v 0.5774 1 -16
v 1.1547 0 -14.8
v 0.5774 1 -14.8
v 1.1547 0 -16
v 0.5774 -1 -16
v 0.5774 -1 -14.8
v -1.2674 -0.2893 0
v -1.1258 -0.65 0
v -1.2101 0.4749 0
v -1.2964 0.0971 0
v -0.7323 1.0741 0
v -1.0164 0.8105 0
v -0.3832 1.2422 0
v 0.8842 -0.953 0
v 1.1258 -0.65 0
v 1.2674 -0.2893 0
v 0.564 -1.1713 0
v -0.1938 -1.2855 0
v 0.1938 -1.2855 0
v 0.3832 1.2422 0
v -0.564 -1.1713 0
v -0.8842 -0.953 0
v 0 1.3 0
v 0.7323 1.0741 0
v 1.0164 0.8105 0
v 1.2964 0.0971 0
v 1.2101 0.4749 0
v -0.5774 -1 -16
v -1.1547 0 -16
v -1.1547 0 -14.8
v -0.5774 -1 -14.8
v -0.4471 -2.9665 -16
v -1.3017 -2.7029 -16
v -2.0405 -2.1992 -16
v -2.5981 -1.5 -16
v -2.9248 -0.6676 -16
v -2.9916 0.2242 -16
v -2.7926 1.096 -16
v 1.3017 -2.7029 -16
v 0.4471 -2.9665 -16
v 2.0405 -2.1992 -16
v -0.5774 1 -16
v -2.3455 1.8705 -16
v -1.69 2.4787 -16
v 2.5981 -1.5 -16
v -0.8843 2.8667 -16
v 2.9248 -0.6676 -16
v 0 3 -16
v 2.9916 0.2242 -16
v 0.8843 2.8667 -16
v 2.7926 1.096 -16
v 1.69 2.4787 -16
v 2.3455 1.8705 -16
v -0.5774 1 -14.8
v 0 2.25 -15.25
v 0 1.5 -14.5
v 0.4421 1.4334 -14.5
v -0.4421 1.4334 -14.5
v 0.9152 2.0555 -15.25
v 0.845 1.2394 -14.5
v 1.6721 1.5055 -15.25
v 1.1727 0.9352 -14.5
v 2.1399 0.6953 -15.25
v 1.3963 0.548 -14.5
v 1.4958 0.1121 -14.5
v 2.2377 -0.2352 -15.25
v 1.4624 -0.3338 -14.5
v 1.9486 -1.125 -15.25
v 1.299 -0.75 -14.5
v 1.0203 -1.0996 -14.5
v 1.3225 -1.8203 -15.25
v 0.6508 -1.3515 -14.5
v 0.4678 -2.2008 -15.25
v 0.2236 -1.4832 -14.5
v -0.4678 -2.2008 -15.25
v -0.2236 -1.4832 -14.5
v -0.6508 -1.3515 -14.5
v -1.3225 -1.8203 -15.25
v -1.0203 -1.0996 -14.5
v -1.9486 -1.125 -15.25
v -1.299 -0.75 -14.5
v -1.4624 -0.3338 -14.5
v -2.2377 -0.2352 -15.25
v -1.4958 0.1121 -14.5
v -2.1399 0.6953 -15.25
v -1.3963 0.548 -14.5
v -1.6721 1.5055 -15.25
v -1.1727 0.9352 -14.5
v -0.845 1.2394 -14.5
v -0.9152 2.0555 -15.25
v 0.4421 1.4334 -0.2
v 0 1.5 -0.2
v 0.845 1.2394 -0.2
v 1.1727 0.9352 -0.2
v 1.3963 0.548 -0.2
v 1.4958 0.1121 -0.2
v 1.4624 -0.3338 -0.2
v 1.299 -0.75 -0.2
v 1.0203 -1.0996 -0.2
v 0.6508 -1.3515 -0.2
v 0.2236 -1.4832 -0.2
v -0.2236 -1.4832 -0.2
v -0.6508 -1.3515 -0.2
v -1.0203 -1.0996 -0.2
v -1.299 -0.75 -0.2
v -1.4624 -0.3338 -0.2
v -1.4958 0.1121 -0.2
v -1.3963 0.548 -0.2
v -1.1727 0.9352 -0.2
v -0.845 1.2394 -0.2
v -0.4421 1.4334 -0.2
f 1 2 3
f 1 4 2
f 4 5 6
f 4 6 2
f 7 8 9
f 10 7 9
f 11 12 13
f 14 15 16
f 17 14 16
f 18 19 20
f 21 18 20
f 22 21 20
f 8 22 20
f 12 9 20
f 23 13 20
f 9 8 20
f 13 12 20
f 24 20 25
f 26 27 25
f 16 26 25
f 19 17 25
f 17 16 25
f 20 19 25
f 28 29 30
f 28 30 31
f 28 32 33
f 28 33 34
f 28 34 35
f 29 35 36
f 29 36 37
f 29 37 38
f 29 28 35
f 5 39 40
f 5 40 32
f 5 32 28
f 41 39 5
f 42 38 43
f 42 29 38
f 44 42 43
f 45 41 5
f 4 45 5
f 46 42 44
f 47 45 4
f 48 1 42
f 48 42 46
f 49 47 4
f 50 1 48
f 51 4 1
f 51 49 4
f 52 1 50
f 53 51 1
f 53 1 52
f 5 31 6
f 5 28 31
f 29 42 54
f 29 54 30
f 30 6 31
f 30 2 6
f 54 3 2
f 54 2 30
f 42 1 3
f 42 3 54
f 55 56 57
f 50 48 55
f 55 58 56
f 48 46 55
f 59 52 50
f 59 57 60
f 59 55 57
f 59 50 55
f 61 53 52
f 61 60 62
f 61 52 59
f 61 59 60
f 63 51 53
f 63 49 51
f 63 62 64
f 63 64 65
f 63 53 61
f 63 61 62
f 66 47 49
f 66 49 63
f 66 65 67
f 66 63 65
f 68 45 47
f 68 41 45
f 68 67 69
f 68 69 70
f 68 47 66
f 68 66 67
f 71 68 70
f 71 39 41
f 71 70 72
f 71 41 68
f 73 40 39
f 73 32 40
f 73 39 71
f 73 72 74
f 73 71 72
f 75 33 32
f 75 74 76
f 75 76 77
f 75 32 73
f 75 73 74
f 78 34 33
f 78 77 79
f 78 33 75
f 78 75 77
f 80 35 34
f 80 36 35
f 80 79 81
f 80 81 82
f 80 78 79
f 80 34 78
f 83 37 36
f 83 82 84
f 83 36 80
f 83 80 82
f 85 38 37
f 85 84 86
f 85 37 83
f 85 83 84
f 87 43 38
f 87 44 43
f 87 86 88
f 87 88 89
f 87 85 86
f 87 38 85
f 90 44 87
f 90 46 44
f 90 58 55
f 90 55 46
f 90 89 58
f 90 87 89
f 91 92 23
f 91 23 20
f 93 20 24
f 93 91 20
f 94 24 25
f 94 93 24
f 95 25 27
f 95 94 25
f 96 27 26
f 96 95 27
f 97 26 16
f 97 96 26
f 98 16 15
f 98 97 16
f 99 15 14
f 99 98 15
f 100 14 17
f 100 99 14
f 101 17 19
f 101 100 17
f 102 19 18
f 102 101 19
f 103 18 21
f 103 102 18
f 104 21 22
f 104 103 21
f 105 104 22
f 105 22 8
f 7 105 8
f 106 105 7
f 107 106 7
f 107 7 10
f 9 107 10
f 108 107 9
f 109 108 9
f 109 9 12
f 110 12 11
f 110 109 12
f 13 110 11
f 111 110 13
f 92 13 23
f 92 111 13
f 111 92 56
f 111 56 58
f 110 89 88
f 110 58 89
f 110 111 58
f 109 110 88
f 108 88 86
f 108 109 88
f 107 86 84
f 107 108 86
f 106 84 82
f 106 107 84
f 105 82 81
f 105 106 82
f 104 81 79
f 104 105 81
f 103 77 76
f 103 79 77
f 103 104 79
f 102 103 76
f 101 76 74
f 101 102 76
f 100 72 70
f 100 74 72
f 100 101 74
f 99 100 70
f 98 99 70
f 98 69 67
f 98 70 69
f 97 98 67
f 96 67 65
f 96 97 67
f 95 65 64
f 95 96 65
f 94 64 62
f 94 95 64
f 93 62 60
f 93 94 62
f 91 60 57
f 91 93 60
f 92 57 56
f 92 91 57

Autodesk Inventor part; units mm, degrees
ref_plane "YZ Plane" through (0, 0, 0) normal (1, 0, 0) x (0, 1, 0)
ref_plane "XZ Plane" through (0, 0, 0) normal (0, 1, 0) x (-1, 0, 0)
ref_plane "XY Plane" through (0, 0, 0) normal (0, 0, 1) x (1, 0, 0)
sketch "Sketch1" plane through (0, 0, 0) normal (1, 0, 0) x (0, 1, 0)
  line L0 (0, 0) -> (0, -16)
  line L1 (0, -16) -> (3, -16)
  line L2 (3, -16) -> (1.5, -14.5)
  line L3 (1.5, -14.5) -> (1.5, 0)
  line L4 (1.5, 0) -> (0, 0)
  dimension "d0" = 6
  dimension "d1" = 16
  dimension "d2" = 45
  dimension "d3" = 3
revolve "Revolution1" add sketch "Sketch1" angle 360 about axis through (0, 0, 0) along (0, 0, -1)
chamfer "Chamfer1" distance 0.2 angle 45 1 edges at (0, -1.5, 0)
thread "Thread1" size "M3x0.5" class "6g" standard "ANSI Metric M Profile" full length
sketch "Sketch2" plane through (0, 0, -16) normal (0, 0, -1) x (-1, 0, 0)
  circle A0 centre (0, 0) radius 1.3 projected
  line L0 (1.1547, 0) -> (0.5774, -1)
  line L1 (0.5774, -1) -> (-0.5774, -1)
  line L2 (-0.5774, -1) -> (-1.1547, 0)
  line L3 (-1.1547, 0) -> (-0.5774, 1)
  line L4 (-0.5774, 1) -> (0.5774, 1)
  line L5 (0.5774, 1) -> (1.1547, 0)
  dimension "d10" = 2
extrude "Extrusion1" cut sketch "Sketch2" against normal blind 1.2 contours L0 L1 L2 L3 L4 L5
properties part number "M3 x 16mm FHCS"
